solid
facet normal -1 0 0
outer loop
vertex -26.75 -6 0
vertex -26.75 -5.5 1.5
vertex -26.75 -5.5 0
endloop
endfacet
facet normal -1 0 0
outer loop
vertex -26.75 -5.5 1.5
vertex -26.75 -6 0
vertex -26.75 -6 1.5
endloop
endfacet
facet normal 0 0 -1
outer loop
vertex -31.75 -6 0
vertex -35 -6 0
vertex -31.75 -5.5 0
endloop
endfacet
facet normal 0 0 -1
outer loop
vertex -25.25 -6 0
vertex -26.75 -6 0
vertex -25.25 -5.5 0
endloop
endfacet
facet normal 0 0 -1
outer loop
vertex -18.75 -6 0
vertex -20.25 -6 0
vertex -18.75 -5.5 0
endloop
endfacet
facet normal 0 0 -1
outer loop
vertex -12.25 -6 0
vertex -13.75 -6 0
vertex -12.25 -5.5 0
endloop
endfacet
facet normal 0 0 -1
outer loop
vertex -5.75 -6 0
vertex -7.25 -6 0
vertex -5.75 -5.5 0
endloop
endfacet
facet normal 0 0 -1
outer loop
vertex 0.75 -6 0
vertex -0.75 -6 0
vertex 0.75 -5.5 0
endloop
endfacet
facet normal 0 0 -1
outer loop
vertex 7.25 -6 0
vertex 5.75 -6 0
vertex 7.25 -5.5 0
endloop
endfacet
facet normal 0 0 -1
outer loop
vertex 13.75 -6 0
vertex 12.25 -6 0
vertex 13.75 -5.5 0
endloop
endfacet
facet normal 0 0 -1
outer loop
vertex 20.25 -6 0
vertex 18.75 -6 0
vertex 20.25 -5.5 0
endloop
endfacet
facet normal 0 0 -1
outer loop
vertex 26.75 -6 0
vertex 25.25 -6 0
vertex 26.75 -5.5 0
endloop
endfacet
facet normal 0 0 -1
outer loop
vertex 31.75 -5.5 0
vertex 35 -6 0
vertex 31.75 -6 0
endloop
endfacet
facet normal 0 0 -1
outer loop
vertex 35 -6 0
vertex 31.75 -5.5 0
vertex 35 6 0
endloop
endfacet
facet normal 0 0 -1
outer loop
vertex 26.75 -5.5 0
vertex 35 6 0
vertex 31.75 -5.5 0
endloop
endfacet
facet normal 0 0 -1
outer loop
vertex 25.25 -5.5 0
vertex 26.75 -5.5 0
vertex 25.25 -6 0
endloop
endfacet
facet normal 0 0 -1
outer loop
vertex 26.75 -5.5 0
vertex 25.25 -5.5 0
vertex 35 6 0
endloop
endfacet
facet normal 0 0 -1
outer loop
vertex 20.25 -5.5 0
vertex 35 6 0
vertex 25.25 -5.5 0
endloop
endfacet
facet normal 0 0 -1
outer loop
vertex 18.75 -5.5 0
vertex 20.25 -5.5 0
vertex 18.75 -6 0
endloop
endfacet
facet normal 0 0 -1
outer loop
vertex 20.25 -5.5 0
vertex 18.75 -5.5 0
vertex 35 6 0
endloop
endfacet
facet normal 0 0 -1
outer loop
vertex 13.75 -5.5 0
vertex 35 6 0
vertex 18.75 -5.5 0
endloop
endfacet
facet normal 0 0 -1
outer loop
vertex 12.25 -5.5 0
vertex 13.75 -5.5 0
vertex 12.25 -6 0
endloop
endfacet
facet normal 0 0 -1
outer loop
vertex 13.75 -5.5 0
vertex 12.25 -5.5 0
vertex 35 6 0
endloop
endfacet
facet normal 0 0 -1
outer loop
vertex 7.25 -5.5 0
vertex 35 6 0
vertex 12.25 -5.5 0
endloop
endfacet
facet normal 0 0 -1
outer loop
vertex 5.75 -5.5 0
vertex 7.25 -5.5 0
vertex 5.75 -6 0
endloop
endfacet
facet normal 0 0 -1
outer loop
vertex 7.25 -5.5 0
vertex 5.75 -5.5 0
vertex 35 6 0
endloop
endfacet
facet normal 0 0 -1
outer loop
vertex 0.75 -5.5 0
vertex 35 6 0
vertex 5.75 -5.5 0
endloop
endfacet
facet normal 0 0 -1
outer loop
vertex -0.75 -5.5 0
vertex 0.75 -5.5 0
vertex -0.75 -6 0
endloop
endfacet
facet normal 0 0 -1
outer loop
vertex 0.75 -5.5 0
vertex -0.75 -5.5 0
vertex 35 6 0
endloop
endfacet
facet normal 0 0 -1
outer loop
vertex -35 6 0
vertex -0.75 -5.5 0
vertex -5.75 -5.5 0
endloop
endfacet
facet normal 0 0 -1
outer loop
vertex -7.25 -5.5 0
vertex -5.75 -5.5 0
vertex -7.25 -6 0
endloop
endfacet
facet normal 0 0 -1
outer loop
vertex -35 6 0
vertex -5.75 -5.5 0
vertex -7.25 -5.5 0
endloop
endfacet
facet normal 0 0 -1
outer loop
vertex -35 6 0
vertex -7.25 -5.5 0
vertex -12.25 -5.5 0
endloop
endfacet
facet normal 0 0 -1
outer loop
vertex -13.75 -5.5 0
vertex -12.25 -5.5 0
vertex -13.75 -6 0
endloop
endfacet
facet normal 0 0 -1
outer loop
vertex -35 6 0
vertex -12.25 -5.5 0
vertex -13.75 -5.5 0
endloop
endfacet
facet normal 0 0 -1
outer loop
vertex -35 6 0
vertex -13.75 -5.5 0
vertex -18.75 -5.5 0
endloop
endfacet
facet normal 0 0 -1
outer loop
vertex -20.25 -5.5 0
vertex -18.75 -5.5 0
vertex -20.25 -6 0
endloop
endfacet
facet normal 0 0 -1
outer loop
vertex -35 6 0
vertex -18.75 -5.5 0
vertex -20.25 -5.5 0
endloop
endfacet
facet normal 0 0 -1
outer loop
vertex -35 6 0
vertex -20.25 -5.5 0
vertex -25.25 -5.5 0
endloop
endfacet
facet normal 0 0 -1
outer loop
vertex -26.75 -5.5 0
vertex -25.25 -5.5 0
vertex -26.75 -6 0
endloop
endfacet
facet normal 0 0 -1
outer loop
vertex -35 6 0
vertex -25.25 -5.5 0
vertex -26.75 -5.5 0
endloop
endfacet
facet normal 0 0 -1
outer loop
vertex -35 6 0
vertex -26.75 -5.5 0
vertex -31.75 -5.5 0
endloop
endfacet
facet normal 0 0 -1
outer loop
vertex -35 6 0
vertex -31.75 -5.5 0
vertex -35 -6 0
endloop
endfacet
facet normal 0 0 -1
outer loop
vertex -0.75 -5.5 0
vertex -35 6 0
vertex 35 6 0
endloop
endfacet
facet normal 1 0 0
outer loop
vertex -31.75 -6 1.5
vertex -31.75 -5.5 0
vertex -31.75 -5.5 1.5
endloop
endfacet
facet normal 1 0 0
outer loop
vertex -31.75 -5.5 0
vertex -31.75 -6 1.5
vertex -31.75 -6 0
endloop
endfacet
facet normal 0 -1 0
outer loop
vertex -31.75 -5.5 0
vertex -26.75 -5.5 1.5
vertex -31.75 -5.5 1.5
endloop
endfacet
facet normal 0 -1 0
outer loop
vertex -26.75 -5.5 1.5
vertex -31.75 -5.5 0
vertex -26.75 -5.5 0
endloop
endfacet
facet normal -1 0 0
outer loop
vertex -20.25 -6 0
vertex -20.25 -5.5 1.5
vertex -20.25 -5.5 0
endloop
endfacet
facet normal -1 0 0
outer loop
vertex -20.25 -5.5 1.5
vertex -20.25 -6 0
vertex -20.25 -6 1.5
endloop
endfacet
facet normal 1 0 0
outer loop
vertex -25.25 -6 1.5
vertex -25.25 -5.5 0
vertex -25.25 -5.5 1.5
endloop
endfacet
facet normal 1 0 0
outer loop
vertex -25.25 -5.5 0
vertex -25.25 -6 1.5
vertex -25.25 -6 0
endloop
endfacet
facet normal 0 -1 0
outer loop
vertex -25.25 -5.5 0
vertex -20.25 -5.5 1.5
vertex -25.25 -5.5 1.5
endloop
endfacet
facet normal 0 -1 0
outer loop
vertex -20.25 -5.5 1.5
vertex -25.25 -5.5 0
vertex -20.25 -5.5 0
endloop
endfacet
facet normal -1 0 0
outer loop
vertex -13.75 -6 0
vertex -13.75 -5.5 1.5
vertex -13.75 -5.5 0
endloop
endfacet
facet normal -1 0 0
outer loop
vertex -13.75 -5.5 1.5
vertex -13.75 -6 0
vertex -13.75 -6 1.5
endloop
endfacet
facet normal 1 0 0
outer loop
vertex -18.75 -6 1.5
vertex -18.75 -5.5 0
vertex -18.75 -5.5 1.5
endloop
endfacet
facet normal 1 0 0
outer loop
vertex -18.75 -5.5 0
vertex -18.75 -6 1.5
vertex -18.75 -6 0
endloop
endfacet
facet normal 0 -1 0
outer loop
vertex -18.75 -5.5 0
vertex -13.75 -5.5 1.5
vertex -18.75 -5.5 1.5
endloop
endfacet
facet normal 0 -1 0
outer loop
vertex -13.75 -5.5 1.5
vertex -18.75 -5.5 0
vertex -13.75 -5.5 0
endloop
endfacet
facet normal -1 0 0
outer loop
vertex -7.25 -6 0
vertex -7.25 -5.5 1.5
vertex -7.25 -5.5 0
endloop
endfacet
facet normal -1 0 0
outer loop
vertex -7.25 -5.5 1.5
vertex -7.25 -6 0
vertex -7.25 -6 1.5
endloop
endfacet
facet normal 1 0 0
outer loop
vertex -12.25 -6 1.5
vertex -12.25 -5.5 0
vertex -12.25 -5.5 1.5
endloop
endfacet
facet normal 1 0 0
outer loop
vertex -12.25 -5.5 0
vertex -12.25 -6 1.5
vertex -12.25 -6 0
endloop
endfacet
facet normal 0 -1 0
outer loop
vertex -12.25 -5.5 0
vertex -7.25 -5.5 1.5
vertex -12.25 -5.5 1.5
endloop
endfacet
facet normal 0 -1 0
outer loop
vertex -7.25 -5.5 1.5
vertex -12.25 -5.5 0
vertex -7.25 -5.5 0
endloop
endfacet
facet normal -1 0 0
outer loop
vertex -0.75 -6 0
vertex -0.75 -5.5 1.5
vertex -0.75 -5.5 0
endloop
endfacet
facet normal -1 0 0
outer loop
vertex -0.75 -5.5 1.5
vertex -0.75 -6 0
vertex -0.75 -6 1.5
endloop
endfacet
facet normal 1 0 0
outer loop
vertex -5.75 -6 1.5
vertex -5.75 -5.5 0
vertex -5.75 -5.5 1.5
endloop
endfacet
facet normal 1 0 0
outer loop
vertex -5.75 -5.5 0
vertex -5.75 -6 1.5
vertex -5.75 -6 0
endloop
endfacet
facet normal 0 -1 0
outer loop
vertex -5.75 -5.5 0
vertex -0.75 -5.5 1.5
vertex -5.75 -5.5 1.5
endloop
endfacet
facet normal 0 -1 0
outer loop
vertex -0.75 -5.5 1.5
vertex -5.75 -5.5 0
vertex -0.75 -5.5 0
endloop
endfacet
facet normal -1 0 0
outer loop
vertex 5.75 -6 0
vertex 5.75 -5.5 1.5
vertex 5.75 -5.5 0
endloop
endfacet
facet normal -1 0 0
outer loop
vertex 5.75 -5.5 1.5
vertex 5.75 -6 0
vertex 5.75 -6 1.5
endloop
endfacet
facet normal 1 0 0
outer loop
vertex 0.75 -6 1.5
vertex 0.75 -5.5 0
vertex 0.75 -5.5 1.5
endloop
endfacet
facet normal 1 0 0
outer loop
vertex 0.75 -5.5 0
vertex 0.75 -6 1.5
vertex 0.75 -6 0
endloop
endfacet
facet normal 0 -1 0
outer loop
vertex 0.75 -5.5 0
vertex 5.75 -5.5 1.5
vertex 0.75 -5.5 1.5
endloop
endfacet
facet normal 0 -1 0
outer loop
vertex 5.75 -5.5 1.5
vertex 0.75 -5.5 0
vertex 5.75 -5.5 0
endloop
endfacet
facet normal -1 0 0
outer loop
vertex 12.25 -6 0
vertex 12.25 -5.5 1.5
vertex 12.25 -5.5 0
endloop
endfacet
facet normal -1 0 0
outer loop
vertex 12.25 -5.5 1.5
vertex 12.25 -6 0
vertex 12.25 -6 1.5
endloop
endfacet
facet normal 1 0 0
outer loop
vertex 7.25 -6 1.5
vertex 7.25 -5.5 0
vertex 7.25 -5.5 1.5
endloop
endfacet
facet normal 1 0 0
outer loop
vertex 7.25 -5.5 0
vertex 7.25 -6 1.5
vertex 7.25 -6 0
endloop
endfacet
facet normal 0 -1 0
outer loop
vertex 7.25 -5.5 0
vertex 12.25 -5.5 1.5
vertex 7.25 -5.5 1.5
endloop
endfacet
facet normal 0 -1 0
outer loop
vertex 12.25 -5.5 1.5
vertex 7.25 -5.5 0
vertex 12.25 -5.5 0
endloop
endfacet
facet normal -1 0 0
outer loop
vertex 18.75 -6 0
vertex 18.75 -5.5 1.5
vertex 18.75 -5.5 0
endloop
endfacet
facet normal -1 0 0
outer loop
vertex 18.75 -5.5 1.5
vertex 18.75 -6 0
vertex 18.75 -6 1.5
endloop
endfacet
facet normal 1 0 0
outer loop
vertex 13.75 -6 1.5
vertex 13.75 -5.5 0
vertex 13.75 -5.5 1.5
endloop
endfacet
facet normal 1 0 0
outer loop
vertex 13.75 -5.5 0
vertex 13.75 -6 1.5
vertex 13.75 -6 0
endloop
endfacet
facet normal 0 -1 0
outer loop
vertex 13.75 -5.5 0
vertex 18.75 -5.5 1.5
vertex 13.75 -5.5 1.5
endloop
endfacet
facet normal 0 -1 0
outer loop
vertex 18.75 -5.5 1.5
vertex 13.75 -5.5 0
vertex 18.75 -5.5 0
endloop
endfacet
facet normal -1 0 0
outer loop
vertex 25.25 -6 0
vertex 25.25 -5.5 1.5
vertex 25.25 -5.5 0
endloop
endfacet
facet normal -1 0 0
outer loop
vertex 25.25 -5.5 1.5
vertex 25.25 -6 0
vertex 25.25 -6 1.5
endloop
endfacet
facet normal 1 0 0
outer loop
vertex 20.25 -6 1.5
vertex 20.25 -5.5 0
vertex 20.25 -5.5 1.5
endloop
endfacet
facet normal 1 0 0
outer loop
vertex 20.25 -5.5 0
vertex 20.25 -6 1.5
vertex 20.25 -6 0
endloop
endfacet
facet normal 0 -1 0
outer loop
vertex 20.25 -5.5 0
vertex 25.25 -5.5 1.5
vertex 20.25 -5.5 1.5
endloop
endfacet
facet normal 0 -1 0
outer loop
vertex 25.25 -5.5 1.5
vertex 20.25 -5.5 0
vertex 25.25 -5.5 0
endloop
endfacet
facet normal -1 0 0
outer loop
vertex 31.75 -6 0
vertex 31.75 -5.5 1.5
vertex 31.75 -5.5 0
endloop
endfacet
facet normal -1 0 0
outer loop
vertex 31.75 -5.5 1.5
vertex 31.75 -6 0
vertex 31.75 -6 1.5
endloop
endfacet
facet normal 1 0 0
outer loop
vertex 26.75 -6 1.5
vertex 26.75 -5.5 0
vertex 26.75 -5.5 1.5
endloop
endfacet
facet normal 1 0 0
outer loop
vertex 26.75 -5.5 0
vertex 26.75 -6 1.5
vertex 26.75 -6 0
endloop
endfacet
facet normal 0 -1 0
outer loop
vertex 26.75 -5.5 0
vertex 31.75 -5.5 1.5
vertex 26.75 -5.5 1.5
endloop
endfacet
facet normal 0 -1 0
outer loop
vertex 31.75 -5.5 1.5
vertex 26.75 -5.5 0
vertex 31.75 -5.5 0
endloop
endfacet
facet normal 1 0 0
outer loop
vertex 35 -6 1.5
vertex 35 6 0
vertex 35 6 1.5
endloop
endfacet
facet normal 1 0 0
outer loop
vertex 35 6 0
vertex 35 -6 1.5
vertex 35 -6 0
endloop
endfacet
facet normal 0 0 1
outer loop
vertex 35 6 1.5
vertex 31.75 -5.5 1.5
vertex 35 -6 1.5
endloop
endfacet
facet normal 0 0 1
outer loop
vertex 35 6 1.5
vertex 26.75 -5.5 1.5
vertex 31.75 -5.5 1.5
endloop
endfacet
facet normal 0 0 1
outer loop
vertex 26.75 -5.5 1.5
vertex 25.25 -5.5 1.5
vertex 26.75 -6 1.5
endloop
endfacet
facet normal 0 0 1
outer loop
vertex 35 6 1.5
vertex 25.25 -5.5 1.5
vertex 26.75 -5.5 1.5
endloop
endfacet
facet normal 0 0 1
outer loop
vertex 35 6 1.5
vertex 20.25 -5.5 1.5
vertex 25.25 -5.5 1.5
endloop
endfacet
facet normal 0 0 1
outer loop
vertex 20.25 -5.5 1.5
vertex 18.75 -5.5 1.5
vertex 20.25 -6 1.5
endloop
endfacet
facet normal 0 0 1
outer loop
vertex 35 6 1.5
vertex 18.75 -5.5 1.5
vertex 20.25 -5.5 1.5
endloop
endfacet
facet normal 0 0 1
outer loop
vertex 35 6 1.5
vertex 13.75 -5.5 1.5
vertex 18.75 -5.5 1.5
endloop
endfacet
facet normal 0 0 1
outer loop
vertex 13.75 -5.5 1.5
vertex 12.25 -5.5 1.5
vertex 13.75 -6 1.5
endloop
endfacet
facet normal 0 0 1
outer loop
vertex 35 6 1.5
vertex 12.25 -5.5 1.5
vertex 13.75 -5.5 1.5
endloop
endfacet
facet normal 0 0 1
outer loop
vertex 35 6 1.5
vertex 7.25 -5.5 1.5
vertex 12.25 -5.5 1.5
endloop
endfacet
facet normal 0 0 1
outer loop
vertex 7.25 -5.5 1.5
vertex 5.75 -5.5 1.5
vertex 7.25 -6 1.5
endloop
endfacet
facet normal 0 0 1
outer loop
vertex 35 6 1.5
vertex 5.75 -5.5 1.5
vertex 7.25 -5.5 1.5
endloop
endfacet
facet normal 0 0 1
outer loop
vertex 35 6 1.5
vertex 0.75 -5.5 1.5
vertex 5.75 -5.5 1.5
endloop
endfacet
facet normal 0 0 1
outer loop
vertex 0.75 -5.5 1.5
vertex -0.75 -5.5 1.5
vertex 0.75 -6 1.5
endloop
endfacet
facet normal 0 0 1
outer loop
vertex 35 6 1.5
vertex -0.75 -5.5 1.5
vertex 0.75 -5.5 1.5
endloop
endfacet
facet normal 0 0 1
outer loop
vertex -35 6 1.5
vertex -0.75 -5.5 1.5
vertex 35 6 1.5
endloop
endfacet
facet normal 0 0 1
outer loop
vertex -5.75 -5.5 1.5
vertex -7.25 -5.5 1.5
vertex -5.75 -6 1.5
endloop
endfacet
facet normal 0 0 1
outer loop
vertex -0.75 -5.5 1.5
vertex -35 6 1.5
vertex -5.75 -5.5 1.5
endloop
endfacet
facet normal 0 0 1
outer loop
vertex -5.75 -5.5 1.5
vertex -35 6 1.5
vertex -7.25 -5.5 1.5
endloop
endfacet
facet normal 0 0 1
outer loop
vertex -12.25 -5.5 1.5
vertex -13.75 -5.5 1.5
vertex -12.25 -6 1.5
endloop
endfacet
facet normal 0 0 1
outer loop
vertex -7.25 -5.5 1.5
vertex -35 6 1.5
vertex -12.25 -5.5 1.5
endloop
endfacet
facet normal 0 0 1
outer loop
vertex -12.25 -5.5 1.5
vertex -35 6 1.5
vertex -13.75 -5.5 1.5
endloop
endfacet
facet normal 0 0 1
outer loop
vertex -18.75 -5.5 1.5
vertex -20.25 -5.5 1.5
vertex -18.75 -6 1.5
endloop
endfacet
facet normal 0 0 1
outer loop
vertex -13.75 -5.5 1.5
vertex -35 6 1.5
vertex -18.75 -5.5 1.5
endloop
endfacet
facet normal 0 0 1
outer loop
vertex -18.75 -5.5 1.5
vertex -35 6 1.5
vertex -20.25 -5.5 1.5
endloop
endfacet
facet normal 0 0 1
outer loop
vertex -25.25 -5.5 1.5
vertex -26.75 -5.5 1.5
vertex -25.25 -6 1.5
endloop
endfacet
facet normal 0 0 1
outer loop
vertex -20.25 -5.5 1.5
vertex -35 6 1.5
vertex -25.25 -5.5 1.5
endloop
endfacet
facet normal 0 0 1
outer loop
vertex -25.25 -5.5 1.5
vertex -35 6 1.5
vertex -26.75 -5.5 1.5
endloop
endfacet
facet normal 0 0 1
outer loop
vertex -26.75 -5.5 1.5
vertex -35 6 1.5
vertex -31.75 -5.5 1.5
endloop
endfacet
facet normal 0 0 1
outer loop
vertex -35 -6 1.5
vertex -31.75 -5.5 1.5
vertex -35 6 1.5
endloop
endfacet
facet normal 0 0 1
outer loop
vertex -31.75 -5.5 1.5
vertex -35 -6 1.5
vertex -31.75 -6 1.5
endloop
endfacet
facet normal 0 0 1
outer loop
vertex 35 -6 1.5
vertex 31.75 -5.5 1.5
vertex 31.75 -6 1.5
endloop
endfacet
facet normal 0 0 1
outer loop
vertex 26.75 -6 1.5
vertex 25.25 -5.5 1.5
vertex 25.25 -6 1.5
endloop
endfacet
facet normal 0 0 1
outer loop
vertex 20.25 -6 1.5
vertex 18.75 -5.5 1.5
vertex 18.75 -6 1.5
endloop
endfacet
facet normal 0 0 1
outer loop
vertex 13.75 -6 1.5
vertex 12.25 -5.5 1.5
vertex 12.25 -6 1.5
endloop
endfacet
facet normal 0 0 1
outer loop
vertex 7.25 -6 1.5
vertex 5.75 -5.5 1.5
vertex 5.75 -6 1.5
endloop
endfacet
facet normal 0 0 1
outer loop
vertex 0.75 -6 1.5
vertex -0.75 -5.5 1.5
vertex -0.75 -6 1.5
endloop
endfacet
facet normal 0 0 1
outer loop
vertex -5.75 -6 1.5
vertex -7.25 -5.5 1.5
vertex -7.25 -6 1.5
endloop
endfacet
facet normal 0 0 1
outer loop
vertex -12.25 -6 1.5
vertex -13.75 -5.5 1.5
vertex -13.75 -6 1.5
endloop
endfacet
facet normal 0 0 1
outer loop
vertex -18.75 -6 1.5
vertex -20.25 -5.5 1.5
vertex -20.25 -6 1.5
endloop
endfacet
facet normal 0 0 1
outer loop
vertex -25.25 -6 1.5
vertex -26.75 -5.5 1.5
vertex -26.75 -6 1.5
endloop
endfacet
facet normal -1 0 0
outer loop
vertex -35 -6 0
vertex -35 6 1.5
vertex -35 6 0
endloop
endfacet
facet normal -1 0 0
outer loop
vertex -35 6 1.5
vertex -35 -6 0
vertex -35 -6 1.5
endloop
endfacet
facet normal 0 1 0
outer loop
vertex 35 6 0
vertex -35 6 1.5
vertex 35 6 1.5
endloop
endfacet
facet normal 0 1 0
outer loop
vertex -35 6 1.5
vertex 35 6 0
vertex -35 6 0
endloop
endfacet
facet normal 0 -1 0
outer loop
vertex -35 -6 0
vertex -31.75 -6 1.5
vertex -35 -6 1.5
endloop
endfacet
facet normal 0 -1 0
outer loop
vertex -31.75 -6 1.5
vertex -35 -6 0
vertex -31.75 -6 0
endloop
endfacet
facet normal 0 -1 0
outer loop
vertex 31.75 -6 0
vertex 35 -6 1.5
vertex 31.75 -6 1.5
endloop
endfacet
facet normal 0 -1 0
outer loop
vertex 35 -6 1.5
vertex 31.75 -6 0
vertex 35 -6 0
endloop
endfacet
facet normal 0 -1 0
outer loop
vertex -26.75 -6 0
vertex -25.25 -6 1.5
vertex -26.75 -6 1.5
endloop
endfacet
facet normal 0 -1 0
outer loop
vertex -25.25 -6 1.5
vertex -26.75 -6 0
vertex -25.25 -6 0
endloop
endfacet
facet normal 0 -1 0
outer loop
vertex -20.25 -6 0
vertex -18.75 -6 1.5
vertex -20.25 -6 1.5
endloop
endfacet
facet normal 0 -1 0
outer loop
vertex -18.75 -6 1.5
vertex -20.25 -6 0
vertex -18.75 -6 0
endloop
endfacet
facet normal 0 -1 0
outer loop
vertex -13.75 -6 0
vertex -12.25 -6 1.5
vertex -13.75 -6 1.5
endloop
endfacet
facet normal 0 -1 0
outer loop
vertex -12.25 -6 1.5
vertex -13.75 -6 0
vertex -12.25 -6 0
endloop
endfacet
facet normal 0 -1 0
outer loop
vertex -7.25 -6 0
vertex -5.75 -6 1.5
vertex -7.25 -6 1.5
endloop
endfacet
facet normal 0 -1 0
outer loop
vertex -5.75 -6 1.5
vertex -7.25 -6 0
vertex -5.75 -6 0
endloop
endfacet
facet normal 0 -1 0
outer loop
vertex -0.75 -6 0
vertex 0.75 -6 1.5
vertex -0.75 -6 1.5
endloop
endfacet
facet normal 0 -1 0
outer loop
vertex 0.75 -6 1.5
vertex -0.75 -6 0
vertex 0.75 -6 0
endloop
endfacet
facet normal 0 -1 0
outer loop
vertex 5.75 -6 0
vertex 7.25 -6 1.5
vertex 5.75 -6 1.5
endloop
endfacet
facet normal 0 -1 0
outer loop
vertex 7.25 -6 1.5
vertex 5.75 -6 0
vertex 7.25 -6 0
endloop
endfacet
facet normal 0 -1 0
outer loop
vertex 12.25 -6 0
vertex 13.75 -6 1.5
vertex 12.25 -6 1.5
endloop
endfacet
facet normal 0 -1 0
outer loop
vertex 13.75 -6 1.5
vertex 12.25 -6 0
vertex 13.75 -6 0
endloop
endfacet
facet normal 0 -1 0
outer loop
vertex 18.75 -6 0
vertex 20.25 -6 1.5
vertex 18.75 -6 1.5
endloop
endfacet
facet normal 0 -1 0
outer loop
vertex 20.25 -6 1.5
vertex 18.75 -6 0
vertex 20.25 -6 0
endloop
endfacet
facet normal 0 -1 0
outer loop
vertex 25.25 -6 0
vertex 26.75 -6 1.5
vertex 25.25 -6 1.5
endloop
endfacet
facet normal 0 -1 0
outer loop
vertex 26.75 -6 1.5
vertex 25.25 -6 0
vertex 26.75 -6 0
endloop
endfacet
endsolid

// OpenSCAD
// 10-well comb for casting agarose gels
// Print orientation: flat on bed, teeth pointing down (-Z)

// ---------- Parameters ----------
plate_thk     = 1.5;    // plate thickness (Z)
spine_len     = 70;     // spine length (X)
spine_wid     = 12;     // spine width (Y)
tooth_count   = 10;     // number of teeth
tooth_w       = 5.0;    // tooth width (X)
tooth_len     = 12;     // tooth length (Y)
gap           = 1.5;    // gap between teeth (X)
overcut       = 0.5;    // extra length on cutters past faces
$fn           = 64;     // curve resolution

// ---------- Derived ----------
pitch   = tooth_w + gap;                 // centre-to-centre tooth spacing
x0      = -(tooth_count - 1) * pitch / 2; // first tooth centre (row centred)
teeth_span = (tooth_count - 1) * pitch + tooth_w; // distance first-to-last tooth

// ---------- Model ----------
difference() {
    // Base plate
    translate([-spine_len/2, -spine_wid/2, 0])
        cube([spine_len, spine_wid, plate_thk]);

    // Teeth hanging in -Y from the spine
    for (i = [0 : tooth_count - 1])
        translate([x0 + i * pitch - tooth_w/2, -spine_wid/2 - tooth_len, 0])
            cube([tooth_w, tooth_len + overcut, plate_thk + overcut]);
}
